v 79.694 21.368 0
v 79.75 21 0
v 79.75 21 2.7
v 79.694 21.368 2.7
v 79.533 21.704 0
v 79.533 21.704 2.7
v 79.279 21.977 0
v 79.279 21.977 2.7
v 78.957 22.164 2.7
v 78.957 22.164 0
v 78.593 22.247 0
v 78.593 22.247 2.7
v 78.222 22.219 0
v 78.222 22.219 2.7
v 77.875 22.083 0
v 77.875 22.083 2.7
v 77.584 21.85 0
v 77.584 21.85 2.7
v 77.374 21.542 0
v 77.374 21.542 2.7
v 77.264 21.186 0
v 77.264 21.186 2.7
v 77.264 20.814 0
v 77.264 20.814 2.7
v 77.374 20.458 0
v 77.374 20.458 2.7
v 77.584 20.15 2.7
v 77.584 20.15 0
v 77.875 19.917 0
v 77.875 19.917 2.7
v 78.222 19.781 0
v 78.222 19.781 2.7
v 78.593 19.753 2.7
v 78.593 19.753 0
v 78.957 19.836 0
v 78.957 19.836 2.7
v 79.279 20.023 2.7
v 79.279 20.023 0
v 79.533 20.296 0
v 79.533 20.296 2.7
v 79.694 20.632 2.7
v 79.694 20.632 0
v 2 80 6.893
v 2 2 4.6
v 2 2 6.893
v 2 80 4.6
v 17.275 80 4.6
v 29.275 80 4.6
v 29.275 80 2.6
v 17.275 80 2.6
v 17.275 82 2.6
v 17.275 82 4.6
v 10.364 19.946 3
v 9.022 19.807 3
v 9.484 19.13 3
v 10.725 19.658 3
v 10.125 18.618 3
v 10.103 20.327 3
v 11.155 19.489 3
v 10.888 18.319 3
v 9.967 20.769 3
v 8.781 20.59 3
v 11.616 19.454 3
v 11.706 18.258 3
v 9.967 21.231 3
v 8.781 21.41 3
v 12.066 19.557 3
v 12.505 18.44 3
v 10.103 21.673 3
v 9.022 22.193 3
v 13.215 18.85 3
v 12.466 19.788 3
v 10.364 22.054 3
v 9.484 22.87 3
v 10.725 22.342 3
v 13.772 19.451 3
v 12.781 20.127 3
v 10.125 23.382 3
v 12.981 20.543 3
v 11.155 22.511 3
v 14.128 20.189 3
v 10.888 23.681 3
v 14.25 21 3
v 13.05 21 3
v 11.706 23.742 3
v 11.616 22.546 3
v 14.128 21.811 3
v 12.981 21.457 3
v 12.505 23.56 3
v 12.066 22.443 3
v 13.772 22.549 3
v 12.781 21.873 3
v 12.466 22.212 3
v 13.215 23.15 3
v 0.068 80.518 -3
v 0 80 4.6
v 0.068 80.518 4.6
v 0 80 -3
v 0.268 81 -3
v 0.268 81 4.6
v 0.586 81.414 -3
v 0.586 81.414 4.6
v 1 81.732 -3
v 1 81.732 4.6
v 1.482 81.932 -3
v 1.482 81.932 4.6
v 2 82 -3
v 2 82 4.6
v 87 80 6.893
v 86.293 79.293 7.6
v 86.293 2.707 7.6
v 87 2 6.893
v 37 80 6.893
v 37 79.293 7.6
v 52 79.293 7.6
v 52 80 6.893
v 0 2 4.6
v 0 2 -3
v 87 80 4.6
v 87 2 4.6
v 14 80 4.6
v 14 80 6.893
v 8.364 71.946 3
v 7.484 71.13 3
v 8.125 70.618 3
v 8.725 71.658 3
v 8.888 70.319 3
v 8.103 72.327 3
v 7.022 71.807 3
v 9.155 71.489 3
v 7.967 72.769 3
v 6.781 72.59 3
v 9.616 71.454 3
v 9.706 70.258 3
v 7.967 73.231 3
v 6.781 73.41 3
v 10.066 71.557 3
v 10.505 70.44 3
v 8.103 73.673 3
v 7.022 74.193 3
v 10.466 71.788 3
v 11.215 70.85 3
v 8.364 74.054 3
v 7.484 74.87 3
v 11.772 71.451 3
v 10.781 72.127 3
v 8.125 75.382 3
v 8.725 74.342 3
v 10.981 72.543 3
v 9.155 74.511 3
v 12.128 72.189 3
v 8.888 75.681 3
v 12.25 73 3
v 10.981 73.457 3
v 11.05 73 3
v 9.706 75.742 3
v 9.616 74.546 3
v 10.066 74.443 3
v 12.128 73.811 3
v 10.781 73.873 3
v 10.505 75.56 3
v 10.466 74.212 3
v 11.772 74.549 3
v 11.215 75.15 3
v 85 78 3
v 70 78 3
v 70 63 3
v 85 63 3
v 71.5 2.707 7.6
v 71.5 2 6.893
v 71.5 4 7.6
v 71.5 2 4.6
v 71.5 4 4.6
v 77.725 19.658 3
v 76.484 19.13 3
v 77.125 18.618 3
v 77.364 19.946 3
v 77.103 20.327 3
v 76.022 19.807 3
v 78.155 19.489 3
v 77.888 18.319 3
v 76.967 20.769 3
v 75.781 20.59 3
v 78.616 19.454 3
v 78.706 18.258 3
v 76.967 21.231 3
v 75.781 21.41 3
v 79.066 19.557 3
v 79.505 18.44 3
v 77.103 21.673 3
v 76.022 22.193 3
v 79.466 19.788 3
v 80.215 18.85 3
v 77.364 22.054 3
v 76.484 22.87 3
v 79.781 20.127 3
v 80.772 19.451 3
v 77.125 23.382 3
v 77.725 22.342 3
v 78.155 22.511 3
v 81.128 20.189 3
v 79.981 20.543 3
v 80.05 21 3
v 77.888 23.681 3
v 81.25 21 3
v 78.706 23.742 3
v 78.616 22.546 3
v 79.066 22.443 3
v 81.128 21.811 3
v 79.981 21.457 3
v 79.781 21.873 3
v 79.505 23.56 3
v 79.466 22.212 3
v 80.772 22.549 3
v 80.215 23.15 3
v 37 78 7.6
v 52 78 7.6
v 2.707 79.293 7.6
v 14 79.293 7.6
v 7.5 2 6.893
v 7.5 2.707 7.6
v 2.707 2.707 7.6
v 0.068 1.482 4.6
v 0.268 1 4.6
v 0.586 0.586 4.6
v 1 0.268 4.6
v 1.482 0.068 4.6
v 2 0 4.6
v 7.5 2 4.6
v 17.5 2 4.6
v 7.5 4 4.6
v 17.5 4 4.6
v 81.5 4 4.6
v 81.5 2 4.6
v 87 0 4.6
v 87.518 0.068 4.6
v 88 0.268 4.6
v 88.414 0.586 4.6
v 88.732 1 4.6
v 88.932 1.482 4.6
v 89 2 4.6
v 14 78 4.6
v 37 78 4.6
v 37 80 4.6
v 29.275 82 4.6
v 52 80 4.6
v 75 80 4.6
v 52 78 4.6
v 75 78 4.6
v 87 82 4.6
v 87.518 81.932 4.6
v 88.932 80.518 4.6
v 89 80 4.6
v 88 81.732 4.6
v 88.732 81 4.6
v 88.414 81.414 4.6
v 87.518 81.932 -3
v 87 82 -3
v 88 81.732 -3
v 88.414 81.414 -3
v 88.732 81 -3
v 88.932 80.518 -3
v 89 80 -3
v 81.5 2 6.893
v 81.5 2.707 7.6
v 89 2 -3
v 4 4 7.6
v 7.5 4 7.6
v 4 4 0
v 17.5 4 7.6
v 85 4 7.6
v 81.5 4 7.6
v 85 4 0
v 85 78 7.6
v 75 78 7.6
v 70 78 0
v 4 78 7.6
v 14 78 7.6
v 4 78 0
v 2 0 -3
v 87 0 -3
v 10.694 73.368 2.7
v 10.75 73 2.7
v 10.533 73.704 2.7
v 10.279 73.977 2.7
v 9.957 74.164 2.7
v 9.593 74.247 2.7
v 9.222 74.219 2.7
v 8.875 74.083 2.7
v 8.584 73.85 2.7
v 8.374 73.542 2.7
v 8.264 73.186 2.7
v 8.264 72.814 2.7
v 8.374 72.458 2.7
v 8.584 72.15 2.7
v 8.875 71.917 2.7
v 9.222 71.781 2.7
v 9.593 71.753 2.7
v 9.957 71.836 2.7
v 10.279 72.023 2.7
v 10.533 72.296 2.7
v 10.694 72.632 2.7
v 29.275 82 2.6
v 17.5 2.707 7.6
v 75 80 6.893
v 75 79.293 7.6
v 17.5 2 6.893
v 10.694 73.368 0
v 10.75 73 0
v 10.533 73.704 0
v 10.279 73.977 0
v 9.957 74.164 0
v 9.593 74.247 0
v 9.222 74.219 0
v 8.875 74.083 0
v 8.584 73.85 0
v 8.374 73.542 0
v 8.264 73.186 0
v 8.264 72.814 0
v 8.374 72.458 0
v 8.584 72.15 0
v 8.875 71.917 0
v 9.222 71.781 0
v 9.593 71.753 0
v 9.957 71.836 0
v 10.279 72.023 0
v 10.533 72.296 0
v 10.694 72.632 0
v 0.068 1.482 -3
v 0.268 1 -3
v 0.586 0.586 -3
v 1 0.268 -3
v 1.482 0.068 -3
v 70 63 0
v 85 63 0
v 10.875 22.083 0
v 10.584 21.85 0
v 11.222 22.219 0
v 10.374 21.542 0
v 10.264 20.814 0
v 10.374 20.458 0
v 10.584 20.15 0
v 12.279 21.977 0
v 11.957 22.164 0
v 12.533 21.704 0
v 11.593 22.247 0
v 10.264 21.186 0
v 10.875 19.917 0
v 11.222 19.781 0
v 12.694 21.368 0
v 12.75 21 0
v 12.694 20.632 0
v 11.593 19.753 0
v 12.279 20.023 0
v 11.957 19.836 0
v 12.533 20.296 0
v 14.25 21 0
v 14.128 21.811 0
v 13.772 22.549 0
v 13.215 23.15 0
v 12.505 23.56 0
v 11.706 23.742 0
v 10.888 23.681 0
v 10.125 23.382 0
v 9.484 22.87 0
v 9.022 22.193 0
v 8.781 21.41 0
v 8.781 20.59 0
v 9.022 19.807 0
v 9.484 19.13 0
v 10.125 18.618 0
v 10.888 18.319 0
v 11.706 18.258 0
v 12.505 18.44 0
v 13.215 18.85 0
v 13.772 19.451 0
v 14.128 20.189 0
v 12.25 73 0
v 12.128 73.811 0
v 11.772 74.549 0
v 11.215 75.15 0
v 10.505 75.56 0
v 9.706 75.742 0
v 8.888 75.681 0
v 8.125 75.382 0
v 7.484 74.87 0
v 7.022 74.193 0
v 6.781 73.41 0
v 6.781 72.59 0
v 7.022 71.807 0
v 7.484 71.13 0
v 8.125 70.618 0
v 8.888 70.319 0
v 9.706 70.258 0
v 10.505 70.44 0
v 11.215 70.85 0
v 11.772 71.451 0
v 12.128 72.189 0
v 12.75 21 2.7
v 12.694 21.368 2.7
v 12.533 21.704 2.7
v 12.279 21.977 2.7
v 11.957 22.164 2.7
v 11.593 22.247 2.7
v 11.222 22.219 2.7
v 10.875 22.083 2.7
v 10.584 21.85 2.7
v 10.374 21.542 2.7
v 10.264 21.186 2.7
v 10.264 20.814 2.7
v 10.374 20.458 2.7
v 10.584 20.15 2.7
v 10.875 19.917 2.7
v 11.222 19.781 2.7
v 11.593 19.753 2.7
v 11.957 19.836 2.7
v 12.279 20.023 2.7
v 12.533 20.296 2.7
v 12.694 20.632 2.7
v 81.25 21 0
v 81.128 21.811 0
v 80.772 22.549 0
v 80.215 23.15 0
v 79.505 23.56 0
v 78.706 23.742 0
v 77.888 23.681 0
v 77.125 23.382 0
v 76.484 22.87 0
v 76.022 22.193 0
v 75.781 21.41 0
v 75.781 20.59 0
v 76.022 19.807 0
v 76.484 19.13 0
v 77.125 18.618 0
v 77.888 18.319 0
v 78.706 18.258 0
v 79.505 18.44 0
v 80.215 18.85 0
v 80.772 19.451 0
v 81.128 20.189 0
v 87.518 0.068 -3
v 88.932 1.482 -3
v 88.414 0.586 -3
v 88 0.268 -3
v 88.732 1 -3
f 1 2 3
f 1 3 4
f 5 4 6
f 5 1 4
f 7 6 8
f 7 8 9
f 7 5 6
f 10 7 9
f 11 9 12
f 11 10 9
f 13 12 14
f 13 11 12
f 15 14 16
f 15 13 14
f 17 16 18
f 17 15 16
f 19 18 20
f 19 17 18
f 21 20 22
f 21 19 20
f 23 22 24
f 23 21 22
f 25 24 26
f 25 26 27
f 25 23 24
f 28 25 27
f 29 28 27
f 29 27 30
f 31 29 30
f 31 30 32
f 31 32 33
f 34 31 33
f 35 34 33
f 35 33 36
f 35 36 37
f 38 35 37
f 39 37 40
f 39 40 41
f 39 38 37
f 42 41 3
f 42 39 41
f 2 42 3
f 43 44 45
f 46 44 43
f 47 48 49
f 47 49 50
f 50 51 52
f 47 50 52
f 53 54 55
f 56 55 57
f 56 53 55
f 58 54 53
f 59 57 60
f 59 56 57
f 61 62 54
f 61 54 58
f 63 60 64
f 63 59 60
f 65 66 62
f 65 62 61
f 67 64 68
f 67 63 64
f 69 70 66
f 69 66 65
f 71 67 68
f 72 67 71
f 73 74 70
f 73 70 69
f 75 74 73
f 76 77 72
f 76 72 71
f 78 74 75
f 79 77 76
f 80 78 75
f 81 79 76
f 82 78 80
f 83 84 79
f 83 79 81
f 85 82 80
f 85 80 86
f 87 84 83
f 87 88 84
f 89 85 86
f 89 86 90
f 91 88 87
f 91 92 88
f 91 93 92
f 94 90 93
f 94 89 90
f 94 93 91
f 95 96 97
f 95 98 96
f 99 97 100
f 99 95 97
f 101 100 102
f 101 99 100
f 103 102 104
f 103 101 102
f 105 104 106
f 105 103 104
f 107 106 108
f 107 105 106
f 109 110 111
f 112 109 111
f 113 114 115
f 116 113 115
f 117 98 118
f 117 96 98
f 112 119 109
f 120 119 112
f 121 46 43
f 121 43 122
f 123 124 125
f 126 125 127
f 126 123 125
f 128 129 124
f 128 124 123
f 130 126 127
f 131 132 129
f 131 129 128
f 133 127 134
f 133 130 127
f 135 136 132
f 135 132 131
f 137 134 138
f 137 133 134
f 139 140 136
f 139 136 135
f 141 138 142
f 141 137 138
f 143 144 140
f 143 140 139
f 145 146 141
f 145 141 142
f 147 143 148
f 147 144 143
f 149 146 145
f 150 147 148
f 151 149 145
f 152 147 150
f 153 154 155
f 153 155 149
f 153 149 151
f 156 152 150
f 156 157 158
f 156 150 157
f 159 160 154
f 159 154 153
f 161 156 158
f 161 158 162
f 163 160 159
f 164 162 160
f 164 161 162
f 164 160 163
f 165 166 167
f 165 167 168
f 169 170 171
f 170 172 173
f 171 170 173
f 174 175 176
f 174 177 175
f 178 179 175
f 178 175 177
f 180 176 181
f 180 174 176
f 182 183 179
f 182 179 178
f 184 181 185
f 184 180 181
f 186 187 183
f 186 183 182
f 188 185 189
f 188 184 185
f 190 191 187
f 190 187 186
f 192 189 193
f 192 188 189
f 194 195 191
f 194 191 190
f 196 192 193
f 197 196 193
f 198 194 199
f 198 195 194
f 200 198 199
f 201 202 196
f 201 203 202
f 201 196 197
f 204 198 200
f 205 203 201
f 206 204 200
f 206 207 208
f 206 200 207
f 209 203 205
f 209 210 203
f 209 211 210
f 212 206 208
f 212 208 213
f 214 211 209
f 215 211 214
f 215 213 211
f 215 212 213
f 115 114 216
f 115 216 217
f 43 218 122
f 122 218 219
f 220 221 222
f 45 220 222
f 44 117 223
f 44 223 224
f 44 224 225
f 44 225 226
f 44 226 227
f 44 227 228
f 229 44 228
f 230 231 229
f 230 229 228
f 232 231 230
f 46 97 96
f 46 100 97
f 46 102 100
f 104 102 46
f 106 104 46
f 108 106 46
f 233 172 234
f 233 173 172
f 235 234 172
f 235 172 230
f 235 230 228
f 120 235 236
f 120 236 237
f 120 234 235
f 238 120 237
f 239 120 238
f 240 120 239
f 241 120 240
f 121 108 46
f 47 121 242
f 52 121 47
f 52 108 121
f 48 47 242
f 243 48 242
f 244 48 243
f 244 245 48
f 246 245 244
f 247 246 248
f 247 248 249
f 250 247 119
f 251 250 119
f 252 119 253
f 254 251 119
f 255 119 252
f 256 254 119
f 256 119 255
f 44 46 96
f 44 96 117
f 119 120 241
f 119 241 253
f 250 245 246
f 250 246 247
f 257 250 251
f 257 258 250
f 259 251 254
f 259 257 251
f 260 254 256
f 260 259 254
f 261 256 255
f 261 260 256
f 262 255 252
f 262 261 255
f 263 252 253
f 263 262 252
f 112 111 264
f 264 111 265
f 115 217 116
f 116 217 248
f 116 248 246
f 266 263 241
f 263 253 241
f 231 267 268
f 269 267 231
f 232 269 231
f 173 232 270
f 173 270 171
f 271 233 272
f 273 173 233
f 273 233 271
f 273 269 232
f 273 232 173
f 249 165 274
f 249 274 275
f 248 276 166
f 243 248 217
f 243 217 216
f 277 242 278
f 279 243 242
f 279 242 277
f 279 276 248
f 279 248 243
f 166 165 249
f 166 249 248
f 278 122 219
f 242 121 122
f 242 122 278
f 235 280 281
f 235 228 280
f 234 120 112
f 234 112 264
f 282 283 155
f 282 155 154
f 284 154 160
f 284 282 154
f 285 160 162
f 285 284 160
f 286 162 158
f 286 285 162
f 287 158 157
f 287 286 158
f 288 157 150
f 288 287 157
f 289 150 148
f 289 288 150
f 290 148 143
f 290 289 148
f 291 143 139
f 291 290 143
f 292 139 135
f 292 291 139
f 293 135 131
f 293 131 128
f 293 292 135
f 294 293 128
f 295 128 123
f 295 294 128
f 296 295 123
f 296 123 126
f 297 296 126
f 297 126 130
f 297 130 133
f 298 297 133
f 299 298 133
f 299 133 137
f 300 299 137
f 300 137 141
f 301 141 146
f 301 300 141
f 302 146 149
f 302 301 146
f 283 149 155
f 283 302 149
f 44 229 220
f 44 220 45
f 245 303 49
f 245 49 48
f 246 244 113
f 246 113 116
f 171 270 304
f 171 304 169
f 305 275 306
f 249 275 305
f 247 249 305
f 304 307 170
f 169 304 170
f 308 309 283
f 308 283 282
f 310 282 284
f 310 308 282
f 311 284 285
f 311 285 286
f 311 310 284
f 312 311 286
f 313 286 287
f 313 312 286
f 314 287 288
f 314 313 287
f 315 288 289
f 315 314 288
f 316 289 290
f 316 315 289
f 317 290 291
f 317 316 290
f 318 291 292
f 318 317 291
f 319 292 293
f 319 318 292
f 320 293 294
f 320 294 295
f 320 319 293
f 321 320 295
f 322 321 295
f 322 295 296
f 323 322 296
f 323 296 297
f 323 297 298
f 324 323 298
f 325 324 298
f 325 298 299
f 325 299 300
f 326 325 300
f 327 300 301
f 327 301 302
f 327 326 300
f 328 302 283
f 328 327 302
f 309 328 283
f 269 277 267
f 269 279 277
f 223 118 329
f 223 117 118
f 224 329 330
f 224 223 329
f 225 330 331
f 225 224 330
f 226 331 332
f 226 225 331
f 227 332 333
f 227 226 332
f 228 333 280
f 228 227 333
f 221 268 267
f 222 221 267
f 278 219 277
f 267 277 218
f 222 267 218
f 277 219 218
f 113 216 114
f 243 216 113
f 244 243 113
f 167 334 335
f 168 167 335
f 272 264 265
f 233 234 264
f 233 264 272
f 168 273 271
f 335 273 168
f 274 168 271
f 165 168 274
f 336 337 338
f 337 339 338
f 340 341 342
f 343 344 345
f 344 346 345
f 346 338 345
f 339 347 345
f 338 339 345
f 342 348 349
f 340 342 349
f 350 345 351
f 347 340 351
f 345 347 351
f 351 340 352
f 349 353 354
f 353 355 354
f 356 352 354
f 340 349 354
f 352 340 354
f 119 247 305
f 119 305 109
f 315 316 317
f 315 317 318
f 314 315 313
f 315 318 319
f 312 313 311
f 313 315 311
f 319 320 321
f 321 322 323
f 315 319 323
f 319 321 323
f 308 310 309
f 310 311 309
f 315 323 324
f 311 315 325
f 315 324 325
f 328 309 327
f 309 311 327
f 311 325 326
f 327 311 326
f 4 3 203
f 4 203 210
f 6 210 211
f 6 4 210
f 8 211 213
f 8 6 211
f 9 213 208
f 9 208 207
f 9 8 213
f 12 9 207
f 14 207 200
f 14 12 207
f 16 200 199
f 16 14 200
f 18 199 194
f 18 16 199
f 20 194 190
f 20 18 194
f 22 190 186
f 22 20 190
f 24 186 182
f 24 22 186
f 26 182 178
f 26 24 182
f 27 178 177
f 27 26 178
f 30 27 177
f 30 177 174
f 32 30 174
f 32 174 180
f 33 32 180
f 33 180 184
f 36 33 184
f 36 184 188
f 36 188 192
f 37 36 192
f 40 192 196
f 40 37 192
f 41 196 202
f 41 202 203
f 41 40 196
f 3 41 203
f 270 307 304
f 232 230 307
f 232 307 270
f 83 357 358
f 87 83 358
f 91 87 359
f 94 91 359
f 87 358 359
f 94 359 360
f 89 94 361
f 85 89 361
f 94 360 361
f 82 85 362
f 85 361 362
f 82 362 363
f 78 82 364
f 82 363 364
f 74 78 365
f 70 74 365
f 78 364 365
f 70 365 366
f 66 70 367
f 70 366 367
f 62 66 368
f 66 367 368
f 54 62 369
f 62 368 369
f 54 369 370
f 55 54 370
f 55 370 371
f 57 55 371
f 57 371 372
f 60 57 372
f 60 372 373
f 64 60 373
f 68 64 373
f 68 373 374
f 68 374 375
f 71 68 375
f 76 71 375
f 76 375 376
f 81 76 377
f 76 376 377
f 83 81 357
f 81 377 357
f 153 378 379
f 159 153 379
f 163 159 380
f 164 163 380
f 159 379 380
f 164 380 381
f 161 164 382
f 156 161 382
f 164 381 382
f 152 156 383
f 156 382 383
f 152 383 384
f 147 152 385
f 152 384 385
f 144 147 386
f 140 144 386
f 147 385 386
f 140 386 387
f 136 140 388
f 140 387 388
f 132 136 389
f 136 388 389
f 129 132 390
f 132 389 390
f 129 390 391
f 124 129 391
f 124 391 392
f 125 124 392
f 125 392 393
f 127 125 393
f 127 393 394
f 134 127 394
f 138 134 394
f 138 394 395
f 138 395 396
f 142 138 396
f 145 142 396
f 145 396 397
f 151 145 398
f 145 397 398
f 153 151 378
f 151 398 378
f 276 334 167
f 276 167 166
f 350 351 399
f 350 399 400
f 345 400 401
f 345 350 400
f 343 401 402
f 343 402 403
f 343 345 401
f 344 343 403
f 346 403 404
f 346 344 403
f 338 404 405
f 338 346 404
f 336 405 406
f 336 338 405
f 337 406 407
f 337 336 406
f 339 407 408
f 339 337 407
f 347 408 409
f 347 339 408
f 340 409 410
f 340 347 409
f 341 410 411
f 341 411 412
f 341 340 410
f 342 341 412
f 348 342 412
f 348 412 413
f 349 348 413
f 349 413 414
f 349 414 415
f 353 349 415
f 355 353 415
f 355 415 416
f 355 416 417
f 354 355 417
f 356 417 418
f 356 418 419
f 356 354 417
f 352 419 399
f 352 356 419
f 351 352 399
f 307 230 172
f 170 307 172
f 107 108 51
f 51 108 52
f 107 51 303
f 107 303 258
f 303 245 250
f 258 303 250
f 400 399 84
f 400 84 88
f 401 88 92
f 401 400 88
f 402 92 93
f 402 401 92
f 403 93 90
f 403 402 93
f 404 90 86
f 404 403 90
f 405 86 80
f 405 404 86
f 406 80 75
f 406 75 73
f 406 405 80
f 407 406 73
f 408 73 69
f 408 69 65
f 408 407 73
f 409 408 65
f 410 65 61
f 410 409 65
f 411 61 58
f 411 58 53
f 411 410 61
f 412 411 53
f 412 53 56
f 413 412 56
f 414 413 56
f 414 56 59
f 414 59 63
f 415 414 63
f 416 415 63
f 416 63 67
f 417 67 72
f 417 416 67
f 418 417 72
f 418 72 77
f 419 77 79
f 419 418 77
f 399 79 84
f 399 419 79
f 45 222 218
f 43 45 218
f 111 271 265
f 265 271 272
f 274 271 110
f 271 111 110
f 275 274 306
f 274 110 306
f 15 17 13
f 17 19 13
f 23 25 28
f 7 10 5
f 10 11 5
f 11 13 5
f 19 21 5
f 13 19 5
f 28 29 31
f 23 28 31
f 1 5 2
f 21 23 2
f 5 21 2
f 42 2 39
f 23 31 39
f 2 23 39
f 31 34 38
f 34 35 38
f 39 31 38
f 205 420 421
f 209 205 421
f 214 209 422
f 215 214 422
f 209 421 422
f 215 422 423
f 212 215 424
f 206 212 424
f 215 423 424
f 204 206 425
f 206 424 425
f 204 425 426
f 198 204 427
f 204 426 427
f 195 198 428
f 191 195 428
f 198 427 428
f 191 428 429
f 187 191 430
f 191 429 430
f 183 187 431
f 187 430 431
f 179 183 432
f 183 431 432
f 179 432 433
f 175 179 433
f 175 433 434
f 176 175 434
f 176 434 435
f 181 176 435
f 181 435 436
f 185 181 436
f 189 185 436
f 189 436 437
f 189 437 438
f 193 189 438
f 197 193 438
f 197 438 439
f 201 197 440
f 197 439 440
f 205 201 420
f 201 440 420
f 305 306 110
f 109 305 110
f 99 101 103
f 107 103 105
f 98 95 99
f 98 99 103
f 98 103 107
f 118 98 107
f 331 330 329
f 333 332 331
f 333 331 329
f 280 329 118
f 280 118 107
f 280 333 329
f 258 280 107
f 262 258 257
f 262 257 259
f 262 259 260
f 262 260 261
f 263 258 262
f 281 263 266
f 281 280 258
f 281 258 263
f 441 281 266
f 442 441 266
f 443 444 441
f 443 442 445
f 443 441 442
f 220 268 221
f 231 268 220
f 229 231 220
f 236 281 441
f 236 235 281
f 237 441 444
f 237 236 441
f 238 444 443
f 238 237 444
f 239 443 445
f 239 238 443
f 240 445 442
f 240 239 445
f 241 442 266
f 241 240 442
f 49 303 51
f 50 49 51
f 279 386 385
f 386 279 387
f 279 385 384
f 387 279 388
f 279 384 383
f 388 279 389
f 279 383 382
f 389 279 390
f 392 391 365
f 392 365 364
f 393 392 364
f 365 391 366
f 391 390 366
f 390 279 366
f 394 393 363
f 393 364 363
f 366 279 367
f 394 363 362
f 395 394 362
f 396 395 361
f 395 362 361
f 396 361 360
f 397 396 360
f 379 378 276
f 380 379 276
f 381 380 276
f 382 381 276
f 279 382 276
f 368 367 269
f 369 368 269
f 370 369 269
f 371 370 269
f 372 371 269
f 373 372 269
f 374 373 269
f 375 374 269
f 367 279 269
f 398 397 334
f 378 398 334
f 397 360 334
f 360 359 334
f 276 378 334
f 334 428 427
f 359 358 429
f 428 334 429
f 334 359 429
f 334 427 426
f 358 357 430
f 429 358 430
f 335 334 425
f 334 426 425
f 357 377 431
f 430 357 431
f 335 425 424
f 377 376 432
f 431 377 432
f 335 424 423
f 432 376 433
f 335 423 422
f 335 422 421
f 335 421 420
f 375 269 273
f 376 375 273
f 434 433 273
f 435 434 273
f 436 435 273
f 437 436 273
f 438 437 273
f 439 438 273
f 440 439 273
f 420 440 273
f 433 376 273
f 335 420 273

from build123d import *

# Parameters (mm, degrees)
SKETCH_W        = 89
SKETCH_H        = 82
SKETCH_W_2      = 81
SKETCH_H_2      = 74
PAD_DEPTH       = 4.6
SKETCH001_W     = 89
SKETCH001_H     = 82
PAD001_DEPTH    = 3
SKETCH002_R     = 2.75
SKETCH002_R_2   = 1.25
PAD002_DEPTH    = 3
SKETCH003_W     = 15
SKETCH003_H     = 15
PAD003_DEPTH    = 3
FILLET_R        = 2
CHAMFER_SIZE    = 0.3
SKETCH004_W     = 15
SKETCH004_H     = 2
SKETCH004_W_2   = 54
SKETCH004_H_2   = 2.0000000001
PAD004_DEPTH    = 3
CHAMFER001_SIZE = 0.707
SKETCH010_W     = 12
SKETCH010_H     = 2
POCKET003_DEPTH = 2


with BuildPart() as part:
    # Sketch → Pad (new body)
    with BuildSketch(Plane.XY):
        with Locations((44.5, 41)):
            Rectangle(SKETCH_W, SKETCH_H)
        with Locations((44.5, 41)):
            Rectangle(SKETCH_W_2, SKETCH_H_2, mode=Mode.SUBTRACT)
    extrude(amount=PAD_DEPTH)

    # Sketch001 (on Face9 of Pad) → Pad001 (join)
    with BuildSketch(Plane(origin=(0, 0, 0), x_dir=(1, 0, 0), z_dir=(0, 0, -1))):
        with Locations((44.5, -41)):
            Rectangle(SKETCH001_W, SKETCH001_H)
    extrude(amount=PAD001_DEPTH)

    # Sketch002 (on Face8 of Pad001) → Pad002 (join)
    with BuildSketch(Plane.XY):
        with Locations((9.5, 73)):
            Circle(SKETCH002_R)
        with Locations((9.5, 73)):
            Circle(SKETCH002_R_2, mode=Mode.SUBTRACT)
        with Locations((78.5, 21)):
            Circle(SKETCH002_R)
        with Locations((78.5, 21)):
            Circle(SKETCH002_R_2, mode=Mode.SUBTRACT)
        with Locations((11.5, 21)):
            Circle(SKETCH002_R)
        with Locations((11.5, 21)):
            Circle(SKETCH002_R_2, mode=Mode.SUBTRACT)
    extrude(amount=PAD002_DEPTH)

    # Sketch003 (on Face11 of Pad002) → Pad003 (join)
    with BuildSketch(Plane.XY):
        with Locations((77.5, 70.5)):
            Rectangle(SKETCH003_W, SKETCH003_H)
    extrude(amount=PAD003_DEPTH)

    # Fillet
    fillet_edges = [part.edges().sort_by_distance(p)[0] for p in [
        (89, 0, 0.8),
        (89, 82, 0.8),
        (0, 0, 0.8),
        (0, 82, 0.8),
    ]]
    fillet(fillet_edges, radius=FILLET_R)

    # Chamfer
    chamfer_edges = [part.edges().sort_by_distance(p)[0] for p in [
        (8.25, 73, 3),
        (10.25, 21, 3),
        (77.25, 21, 3),
    ]]
    chamfer(chamfer_edges, length=CHAMFER_SIZE)

    # Sketch004 (on Face16 of Chamfer) → Pad004 (join)
    with BuildSketch(Plane.XY.offset(4.6)):
        Polygon((4, 78), (4, 4), (7.5, 4), (7.5, 1.9999999999), (2, 1.9999999999), (2, 80), (14, 80), (14, 78), align=None)
        Polygon((85, 4), (85, 78), (75, 78), (75, 80), (87, 80), (87, 1.9999999999), (81.5, 1.9999999999), (81.5, 4), align=None)
        with Locations((44.5, 79)):
            Rectangle(SKETCH004_W, SKETCH004_H)
        with Locations((44.5, 3)):
            Rectangle(SKETCH004_W_2, SKETCH004_H_2)
    extrude(amount=PAD004_DEPTH)

    # Chamfer001
    chamfer001_edges = [part.edges().sort_by_distance(p)[0] for p in [
        (8, 80, 7.6),
        (2, 41, 7.6),
        (44.5, 80, 7.6),
        (81, 80, 7.6),
        (87, 41, 7.6),
        (84.25, 2, 7.6),
        (44.5, 2, 7.6),
        (4.75, 2, 7.6),
    ]]
    chamfer(chamfer001_edges, length=CHAMFER001_SIZE)

    # Sketch010 (on Face16 of Chamfer001) → Pocket003 (cut)
    with BuildSketch(Plane(origin=(0, 82, 0), x_dir=(-1, 0, 0), z_dir=(0, 1, 0))):
        with Locations((-23.275, 3.6)):
            Rectangle(SKETCH010_W, SKETCH010_H)
    extrude(amount=-POCKET003_DEPTH, mode=Mode.SUBTRACT)


solid = part.part
